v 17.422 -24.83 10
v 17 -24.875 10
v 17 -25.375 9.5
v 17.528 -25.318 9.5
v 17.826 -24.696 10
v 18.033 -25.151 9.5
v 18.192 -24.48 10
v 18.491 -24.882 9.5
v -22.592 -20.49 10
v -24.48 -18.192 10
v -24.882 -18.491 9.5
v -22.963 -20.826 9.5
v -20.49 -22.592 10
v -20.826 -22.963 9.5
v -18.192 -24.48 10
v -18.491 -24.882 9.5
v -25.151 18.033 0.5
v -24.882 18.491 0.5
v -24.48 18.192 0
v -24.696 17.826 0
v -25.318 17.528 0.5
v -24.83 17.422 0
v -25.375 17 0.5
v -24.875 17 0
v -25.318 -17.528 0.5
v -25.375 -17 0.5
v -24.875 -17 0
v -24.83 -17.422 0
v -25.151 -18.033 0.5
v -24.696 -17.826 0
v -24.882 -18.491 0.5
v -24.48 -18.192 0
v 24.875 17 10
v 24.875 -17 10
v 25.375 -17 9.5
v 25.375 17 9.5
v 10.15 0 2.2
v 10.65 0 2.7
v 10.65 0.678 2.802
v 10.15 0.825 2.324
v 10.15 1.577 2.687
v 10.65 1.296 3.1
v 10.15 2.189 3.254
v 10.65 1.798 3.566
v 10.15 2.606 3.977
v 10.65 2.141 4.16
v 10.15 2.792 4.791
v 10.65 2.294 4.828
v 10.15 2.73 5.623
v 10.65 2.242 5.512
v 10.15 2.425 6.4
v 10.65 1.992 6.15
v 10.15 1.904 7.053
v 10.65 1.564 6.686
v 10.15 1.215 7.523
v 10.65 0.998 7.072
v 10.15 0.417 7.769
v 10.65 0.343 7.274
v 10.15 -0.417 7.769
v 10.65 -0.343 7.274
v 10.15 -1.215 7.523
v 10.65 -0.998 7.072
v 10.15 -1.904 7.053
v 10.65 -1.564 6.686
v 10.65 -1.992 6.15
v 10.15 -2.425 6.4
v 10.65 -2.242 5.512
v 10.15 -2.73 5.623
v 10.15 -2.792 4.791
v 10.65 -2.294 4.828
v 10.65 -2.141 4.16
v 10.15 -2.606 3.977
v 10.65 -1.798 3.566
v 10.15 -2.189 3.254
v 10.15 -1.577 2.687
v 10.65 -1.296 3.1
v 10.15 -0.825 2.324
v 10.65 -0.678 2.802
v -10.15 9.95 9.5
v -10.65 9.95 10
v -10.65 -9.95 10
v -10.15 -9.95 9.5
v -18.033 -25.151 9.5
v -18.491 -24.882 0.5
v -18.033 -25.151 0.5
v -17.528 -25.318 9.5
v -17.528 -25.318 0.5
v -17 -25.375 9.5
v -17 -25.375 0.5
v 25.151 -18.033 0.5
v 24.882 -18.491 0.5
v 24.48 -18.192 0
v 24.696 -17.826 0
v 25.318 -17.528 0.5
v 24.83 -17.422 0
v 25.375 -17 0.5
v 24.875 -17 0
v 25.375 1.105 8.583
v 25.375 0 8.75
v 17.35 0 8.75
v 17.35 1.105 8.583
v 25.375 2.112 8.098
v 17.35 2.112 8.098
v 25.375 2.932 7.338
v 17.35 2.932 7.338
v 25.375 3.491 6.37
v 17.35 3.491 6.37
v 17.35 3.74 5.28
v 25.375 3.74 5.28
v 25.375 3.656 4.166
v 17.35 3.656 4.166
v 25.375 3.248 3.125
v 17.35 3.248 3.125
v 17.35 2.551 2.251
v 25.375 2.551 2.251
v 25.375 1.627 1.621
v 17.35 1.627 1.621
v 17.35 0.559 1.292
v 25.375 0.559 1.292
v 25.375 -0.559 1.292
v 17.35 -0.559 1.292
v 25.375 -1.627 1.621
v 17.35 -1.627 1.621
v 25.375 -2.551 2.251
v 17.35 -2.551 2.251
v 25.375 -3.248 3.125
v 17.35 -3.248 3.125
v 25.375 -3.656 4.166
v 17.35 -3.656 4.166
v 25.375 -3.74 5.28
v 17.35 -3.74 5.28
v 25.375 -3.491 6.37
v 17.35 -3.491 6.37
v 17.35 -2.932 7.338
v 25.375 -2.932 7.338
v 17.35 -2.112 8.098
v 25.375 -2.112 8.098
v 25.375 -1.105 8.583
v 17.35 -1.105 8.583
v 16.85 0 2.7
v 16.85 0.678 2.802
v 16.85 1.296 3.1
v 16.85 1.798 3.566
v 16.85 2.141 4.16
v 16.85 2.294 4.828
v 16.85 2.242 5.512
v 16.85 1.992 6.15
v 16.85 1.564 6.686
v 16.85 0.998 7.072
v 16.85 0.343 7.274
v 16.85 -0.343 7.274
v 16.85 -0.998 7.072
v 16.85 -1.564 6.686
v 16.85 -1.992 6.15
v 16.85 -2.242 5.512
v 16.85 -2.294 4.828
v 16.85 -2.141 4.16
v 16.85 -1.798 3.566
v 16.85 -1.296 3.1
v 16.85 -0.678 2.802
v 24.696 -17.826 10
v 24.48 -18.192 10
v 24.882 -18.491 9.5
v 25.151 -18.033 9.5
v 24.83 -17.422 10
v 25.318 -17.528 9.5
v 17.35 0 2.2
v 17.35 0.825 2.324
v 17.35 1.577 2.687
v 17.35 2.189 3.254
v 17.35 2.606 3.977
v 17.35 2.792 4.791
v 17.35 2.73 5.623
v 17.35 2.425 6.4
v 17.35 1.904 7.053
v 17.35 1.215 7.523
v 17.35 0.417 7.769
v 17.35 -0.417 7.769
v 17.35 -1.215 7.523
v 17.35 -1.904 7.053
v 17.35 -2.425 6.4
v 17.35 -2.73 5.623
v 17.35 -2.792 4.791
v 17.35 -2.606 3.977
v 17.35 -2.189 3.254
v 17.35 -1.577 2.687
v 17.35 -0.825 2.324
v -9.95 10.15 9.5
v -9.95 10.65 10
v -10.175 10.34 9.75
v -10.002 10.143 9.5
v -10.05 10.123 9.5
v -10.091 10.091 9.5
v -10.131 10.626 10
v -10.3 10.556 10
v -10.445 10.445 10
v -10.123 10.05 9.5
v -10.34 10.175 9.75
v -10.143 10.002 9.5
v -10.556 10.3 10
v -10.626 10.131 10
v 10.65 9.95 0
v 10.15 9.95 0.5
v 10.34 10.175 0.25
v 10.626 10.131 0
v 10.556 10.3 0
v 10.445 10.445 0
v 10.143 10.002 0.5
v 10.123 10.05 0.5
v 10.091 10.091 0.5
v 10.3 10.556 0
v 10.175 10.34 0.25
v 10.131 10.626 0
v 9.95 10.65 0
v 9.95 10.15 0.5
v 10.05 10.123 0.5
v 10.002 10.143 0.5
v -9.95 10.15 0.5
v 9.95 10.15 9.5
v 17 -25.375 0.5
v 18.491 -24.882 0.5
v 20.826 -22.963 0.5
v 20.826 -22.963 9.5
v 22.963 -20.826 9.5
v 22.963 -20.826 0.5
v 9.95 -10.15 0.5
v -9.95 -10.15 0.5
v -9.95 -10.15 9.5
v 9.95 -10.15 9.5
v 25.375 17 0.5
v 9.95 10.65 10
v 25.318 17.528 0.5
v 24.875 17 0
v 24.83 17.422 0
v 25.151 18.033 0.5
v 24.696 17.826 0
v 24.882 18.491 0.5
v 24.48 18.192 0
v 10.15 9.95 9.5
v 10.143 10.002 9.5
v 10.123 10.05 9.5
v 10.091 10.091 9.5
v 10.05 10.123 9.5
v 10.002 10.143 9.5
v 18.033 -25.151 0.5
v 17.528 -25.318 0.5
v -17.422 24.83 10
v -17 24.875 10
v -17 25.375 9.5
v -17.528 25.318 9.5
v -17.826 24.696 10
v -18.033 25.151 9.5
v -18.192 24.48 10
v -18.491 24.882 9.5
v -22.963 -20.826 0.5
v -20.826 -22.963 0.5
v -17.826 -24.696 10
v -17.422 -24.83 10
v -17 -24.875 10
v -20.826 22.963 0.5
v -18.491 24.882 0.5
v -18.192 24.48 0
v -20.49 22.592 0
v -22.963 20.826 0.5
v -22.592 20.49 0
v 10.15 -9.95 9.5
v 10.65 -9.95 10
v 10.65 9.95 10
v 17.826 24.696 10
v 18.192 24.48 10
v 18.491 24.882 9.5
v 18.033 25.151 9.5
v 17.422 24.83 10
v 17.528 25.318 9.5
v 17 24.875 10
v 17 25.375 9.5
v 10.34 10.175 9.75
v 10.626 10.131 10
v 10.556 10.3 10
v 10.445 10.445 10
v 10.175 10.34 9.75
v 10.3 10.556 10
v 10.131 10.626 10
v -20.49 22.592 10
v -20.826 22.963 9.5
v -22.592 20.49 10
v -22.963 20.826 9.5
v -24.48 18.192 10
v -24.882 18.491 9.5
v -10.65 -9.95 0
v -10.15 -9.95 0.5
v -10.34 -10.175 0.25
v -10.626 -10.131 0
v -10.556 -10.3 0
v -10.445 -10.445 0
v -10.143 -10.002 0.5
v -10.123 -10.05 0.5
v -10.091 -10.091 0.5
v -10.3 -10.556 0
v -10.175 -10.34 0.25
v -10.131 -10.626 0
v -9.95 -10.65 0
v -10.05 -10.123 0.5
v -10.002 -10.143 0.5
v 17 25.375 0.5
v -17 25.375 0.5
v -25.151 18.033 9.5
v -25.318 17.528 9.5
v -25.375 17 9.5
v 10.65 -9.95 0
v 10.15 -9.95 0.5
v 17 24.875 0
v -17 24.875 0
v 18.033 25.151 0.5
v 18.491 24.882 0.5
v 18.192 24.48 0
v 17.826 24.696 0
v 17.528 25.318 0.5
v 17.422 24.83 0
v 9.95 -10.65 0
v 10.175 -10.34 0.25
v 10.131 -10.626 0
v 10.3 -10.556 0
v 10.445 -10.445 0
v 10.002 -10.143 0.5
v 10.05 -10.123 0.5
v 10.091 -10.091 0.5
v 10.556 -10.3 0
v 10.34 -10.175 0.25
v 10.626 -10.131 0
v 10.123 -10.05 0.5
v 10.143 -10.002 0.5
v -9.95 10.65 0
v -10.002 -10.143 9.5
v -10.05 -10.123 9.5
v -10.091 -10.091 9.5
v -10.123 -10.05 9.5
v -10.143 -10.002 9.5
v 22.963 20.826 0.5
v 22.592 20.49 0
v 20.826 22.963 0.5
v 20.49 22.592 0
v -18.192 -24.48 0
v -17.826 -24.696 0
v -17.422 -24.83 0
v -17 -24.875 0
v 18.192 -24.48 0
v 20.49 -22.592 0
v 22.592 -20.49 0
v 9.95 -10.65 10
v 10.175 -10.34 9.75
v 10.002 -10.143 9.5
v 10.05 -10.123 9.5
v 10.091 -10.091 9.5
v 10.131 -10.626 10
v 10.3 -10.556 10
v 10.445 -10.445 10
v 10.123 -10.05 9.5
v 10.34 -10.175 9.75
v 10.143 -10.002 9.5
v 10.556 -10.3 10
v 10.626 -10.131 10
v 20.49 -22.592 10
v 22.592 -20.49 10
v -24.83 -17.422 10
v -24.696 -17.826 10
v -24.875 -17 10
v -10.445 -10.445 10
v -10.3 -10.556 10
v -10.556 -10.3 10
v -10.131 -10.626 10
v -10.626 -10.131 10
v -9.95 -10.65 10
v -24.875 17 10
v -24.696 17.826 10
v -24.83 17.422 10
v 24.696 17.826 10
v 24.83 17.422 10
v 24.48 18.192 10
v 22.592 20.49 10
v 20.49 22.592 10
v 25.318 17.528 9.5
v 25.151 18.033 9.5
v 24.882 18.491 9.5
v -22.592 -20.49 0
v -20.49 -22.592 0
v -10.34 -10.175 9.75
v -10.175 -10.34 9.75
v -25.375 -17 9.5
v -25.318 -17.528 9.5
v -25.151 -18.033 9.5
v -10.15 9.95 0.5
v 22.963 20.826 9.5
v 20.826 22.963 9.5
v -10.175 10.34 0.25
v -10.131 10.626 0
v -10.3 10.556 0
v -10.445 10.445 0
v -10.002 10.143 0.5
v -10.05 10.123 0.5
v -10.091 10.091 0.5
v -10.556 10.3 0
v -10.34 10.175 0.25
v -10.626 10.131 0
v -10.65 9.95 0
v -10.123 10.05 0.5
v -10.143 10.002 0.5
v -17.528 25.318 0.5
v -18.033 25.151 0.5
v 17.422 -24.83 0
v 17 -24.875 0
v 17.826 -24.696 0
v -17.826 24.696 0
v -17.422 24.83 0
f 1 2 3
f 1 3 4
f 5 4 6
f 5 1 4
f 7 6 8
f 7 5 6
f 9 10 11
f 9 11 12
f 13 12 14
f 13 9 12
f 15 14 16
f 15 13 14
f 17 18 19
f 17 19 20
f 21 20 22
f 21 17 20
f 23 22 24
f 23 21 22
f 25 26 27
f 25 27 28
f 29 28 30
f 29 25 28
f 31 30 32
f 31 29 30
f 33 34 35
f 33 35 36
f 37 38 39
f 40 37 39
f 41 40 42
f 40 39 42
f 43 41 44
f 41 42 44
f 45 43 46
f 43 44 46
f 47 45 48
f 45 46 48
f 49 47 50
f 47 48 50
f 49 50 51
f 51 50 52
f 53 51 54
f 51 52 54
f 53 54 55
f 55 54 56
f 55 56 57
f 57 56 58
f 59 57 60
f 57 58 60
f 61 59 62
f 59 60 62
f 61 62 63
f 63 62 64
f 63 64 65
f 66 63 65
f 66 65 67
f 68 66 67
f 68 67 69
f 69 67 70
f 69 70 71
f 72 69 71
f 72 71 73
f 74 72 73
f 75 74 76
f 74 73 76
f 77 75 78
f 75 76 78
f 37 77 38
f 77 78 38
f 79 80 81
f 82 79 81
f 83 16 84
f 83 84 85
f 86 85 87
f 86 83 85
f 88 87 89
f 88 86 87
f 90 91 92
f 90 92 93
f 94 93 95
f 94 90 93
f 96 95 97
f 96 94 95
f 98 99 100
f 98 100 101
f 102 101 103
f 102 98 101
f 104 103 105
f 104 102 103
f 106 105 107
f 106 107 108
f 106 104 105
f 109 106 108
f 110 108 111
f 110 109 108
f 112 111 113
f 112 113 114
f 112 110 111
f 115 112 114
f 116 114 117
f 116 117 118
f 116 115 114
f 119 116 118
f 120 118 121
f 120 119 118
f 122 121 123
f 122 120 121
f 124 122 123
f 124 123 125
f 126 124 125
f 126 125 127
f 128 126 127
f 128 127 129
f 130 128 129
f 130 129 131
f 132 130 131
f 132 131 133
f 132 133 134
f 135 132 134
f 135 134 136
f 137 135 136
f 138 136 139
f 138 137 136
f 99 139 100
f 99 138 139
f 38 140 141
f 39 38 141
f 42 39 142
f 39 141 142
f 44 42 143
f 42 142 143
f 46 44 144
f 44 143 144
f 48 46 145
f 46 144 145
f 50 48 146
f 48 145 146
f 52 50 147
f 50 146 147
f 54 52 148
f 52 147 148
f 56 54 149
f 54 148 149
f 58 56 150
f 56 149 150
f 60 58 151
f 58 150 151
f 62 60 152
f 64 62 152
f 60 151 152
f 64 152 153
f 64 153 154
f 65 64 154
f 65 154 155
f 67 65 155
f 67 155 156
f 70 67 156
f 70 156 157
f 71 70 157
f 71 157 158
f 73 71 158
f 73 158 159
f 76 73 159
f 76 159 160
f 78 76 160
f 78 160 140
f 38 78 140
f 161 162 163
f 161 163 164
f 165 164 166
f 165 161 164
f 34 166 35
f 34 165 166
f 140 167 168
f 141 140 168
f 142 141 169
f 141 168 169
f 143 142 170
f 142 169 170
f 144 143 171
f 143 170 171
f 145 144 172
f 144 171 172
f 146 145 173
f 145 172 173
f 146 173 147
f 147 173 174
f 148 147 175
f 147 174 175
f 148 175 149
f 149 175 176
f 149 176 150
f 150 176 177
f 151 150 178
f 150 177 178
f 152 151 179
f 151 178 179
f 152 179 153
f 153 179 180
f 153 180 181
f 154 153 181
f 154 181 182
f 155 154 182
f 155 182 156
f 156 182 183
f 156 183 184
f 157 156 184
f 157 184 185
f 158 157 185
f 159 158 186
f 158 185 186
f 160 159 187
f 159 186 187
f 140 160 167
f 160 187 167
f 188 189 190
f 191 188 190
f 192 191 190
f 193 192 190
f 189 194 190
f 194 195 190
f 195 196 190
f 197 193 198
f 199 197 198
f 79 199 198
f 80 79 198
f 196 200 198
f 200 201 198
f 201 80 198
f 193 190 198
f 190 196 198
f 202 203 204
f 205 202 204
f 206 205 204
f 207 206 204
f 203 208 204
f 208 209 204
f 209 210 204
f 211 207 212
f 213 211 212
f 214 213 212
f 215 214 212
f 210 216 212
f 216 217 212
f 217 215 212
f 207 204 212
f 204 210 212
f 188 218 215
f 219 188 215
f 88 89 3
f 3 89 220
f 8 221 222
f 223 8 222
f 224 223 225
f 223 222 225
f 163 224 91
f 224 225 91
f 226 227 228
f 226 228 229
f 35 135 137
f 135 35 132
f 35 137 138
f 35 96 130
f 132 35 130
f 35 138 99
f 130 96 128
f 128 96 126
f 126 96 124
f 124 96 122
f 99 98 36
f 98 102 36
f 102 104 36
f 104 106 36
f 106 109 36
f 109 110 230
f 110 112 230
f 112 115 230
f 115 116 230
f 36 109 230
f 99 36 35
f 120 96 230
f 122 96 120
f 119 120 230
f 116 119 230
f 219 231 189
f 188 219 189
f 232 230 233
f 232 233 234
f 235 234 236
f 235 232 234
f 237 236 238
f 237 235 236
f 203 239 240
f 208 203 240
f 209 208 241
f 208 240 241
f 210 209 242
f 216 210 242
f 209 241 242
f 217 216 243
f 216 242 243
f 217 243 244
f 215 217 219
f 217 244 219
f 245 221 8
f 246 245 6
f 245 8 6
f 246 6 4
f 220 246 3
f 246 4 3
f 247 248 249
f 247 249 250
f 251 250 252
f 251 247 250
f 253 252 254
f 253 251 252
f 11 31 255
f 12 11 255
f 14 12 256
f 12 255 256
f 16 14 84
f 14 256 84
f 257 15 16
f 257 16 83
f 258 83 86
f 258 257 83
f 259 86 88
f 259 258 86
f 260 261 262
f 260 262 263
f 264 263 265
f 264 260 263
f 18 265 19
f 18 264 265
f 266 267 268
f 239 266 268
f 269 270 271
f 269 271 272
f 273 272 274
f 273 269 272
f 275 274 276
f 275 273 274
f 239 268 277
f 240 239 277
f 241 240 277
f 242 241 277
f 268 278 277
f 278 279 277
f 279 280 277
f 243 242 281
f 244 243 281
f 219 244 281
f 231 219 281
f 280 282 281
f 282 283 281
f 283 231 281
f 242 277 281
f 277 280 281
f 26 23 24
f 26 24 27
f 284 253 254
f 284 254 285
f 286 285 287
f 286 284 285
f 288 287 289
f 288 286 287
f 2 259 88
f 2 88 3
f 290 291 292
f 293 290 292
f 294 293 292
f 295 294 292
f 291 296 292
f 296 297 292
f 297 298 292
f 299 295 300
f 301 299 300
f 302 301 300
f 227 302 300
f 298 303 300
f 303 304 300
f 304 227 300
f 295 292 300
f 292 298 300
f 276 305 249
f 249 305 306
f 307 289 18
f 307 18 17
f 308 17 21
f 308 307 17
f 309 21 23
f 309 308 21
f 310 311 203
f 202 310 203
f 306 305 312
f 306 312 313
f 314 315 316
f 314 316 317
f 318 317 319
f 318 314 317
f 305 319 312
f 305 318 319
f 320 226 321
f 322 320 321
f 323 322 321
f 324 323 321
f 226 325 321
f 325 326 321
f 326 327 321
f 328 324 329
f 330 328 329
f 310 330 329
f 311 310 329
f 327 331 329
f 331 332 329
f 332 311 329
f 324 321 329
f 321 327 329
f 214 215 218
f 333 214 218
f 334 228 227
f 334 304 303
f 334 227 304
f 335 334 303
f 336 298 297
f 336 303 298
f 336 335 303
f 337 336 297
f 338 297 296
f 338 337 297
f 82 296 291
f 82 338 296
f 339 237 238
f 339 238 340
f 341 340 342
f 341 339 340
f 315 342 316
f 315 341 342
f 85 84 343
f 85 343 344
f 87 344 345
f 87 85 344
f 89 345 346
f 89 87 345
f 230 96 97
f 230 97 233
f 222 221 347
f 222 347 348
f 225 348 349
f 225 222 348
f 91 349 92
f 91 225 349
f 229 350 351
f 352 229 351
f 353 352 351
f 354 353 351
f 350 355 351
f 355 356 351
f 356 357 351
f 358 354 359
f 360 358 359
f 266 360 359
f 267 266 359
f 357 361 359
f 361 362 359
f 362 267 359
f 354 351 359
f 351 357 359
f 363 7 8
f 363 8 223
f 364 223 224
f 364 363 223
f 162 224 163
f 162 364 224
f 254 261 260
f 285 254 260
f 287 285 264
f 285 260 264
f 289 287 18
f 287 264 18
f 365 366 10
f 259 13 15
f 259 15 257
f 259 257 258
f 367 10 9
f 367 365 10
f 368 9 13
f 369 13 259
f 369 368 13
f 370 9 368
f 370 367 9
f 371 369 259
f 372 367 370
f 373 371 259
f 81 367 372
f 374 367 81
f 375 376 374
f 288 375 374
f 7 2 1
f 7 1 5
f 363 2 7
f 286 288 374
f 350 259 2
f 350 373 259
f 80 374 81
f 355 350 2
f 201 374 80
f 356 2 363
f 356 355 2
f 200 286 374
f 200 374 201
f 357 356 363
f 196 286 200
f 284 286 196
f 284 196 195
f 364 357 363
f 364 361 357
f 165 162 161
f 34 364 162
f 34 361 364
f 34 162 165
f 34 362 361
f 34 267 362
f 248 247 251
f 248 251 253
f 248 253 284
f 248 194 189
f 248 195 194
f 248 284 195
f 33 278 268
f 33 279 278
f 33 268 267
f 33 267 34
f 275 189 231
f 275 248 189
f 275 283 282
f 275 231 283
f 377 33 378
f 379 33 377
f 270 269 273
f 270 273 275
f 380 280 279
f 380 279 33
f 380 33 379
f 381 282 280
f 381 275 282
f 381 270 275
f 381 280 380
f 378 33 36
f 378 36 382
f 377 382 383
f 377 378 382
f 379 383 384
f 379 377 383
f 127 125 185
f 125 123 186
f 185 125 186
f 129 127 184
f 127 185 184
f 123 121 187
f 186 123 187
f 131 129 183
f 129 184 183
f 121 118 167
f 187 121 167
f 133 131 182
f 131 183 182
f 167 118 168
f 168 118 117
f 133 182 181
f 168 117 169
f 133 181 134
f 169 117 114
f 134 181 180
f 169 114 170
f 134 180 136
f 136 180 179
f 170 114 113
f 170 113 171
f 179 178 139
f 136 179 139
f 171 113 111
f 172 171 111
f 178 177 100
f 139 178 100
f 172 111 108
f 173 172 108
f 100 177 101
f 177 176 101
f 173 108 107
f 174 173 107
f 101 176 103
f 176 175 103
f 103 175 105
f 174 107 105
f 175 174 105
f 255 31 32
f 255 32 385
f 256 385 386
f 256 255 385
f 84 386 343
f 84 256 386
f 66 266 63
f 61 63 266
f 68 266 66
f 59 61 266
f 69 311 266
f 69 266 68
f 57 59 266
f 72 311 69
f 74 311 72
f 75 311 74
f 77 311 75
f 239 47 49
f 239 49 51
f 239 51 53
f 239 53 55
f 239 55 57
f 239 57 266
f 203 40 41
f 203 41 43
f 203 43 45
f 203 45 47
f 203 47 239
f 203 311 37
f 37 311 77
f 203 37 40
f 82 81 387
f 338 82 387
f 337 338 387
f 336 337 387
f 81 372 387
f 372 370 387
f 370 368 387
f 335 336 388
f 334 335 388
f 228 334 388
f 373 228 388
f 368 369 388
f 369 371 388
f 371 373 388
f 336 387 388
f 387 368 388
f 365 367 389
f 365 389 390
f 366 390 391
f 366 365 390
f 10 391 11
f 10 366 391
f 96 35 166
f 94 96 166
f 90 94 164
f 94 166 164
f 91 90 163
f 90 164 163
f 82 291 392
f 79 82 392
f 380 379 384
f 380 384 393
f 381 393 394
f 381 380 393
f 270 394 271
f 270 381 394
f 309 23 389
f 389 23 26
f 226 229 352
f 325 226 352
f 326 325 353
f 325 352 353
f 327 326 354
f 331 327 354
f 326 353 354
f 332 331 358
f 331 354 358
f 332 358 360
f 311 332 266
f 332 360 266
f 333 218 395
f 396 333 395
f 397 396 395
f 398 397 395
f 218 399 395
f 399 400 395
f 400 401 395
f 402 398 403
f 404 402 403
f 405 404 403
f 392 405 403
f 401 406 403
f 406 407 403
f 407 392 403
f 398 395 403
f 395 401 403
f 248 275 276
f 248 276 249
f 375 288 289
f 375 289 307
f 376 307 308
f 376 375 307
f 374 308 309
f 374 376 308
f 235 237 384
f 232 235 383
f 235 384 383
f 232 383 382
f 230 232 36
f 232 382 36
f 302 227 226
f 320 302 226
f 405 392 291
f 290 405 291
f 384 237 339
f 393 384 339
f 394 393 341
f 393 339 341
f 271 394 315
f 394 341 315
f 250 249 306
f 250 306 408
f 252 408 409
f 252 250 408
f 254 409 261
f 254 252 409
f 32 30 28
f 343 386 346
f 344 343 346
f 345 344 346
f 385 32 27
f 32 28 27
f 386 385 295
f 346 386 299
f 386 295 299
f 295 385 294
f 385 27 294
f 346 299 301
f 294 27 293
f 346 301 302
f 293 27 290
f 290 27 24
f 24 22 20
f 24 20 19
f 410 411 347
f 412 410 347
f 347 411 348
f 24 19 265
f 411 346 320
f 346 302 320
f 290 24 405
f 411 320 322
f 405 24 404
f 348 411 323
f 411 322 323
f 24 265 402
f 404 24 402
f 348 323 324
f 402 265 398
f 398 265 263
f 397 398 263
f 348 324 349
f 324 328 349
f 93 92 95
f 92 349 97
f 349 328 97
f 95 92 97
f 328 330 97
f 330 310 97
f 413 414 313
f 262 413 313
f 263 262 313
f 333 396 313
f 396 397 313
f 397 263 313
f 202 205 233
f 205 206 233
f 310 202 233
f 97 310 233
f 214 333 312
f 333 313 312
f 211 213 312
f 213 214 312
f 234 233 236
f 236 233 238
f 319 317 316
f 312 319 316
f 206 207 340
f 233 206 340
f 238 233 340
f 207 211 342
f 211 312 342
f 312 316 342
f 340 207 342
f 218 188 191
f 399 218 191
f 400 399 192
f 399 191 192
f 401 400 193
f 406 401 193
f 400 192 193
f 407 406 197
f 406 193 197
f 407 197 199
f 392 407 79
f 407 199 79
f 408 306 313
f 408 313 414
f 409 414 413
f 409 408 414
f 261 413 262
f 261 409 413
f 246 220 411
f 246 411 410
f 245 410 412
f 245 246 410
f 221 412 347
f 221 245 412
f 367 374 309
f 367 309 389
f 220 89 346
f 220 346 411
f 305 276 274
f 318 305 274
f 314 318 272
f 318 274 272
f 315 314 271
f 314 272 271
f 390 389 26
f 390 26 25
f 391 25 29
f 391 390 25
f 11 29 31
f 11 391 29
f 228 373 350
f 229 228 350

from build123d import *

# Parameters (mm, degrees)
SKIZZE1_W                       = 20.3
SKIZZE1_H                       = 20.3
AUFSATZ_LINEAR_AUSTRAGEN1_DEPTH = 10
VERRUNDUNG1_R                   = 0.2
VERRUNDUNG2_R                   = 2.5
SCHNITT_LINEAR_AUSTRAGEN1_REACH = 52.75
SKIZZE2_R                       = 2.3
CUT_EXTRUDE2_START              = -50.75
SKETCH1_2_R                     = 3.75
CUT_EXTRUDE2_DEPTH              = 8.025
FASE2_SIZE                      = 0.5


with BuildPart() as part:
    # Skizze1 → Aufsatz-Linear austragen1 (new body)
    with BuildSketch(Plane.XY):
        with BuildLine():
            Line((17.807565106, 25.375), (-17.807565106, 25.375))
            ThreePointArc((-17.807565106, 25.375), (-21.920310217, 21.920310217), (-25.375, 17.807565106))
            Line((-25.375, 17.807565106), (-25.375, -17.807565106))
            ThreePointArc((-25.375, -17.807565106), (-21.920310217, -21.920310217), (-17.807565106, -25.375))
            Line((-17.807565106, -25.375), (17.807565106, -25.375))
            ThreePointArc((17.807565106, -25.375), (21.920310217, -21.920310217), (25.375, -17.807565106))
            Line((25.375, -17.807565106), (25.375, 17.807565106))
            ThreePointArc((25.375, 17.807565106), (21.920310217, 21.920310217), (17.807565106, 25.375))
        make_face()
        Rectangle(SKIZZE1_W, SKIZZE1_H, mode=Mode.SUBTRACT)
    extrude(amount=AUFSATZ_LINEAR_AUSTRAGEN1_DEPTH)

    # Verrundung1
    verrundung1_edges = [part.edges().sort_by_distance(p)[0] for p in [
        (10.15, -10.15, 5),
        (10.15, 10.15, 5),
        (-10.15, 10.15, 5),
        (-10.15, -10.15, 5),
    ]]
    fillet(verrundung1_edges, radius=VERRUNDUNG1_R)

    # Verrundung2
    verrundung2_edges = [part.edges().sort_by_distance(p)[0] for p in [
        (25.375, 17.807565106, 5),
        (25.375, -17.807565106, 5),
        (17.807565106, -25.375, 5),
        (-17.807565106, -25.375, 5),
        (-25.375, -17.807565106, 5),
        (-25.375, 17.807565106, 5),
        (-17.807565106, 25.375, 5),
        (17.807565106, 25.375, 5),
    ]]
    fillet(verrundung2_edges, radius=VERRUNDUNG2_R)

    # Skizze2 → Schnitt-Linear austragen1 (cut, up to next)
    with BuildSketch(Plane(origin=(25.375, 0, 0), x_dir=(0, 0, -1), z_dir=(1, 0, 0)), mode=Mode.PRIVATE) as schnitt_linear_austragen1_sk1:
        with Locations((-5, 0)):
            Circle(SKIZZE2_R)
    schnitt_linear_austragen1_tool1 = extrude(schnitt_linear_austragen1_sk1.sketch, amount=-SCHNITT_LINEAR_AUSTRAGEN1_REACH, mode=Mode.PRIVATE) & part.part
    add(schnitt_linear_austragen1_tool1.solids().sort_by_distance((25.375, 0, 5))[0], mode=Mode.SUBTRACT)

    # Sketch1<2> → Cut-Extrude2 (cut)
    with BuildSketch(Plane.ZY.offset(25.375).offset(CUT_EXTRUDE2_START)):
        with Locations((5, 0)):
            Circle(SKETCH1_2_R)
    extrude(amount=CUT_EXTRUDE2_DEPTH, mode=Mode.SUBTRACT)

    # Fase2
    fase2_edges = [part.edges().sort_by_distance(p)[0] for p in [
        (10.15, 0, 7.3),
        (17.35, 0, 7.3),
        (0, -10.15, 0),
        (0, -10.15, 10),
        (10.15, 0, 0),
        (10.15, 0, 10),
        (-10.15, 0, 0),
        (-10.15, 0, 10),
        (0, 10.15, 0),
        (0, 10.15, 10),
        (10.091421356, -10.091421356, 0),
        (10.091421356, -10.091421356, 10),
        (-10.091421356, -10.091421356, 0),
        (-10.091421356, -10.091421356, 10),
        (-10.091421356, 10.091421356, 0),
        (-10.091421356, 10.091421356, 10),
        (10.091421356, 10.091421356, 0),
        (10.091421356, 10.091421356, 10),
        (0, 25.375, 0),
        (0, 25.375, 10),
        (21.920310217, 21.920310217, 0),
        (25.375, 0, 0),
        (21.920310217, -21.920310217, 0),
        (0, -25.375, 0),
        (-21.920310217, -21.920310217, 0),
        (-25.375, 0, 0),
        (-21.920310217, 21.920310217, 0),
        (-17.784891513, 25.248441317, 0),
        (-25.248441317, 17.784891513, 0),
        (-25.248441317, -17.784891513, 0),
        (-17.784891513, -25.248441317, 0),
        (17.784891513, -25.248441317, 0),
        (25.248441317, -17.784891513, 0),
        (25.248441317, 17.784891513, 0),
        (17.784891513, 25.248441317, 0),
        (21.920310217, 21.920310217, 10),
        (-21.920310217, 21.920310217, 10),
        (-25.375, 0, 10),
        (-21.920310217, -21.920310217, 10),
        (0, -25.375, 10),
        (21.920310217, -21.920310217, 10),
        (25.375, 0, 10),
        (-17.784891513, 25.248441317, 10),
        (-25.248441317, 17.784891513, 10),
        (-25.248441317, -17.784891513, 10),
        (-17.784891513, -25.248441317, 10),
        (17.784891513, -25.248441317, 10),
        (25.248441317, -17.784891513, 10),
        (25.248441317, 17.784891513, 10),
        (17.784891513, 25.248441317, 10),
    ]]
    chamfer(fase2_edges, length=FASE2_SIZE)


solid = part.part
